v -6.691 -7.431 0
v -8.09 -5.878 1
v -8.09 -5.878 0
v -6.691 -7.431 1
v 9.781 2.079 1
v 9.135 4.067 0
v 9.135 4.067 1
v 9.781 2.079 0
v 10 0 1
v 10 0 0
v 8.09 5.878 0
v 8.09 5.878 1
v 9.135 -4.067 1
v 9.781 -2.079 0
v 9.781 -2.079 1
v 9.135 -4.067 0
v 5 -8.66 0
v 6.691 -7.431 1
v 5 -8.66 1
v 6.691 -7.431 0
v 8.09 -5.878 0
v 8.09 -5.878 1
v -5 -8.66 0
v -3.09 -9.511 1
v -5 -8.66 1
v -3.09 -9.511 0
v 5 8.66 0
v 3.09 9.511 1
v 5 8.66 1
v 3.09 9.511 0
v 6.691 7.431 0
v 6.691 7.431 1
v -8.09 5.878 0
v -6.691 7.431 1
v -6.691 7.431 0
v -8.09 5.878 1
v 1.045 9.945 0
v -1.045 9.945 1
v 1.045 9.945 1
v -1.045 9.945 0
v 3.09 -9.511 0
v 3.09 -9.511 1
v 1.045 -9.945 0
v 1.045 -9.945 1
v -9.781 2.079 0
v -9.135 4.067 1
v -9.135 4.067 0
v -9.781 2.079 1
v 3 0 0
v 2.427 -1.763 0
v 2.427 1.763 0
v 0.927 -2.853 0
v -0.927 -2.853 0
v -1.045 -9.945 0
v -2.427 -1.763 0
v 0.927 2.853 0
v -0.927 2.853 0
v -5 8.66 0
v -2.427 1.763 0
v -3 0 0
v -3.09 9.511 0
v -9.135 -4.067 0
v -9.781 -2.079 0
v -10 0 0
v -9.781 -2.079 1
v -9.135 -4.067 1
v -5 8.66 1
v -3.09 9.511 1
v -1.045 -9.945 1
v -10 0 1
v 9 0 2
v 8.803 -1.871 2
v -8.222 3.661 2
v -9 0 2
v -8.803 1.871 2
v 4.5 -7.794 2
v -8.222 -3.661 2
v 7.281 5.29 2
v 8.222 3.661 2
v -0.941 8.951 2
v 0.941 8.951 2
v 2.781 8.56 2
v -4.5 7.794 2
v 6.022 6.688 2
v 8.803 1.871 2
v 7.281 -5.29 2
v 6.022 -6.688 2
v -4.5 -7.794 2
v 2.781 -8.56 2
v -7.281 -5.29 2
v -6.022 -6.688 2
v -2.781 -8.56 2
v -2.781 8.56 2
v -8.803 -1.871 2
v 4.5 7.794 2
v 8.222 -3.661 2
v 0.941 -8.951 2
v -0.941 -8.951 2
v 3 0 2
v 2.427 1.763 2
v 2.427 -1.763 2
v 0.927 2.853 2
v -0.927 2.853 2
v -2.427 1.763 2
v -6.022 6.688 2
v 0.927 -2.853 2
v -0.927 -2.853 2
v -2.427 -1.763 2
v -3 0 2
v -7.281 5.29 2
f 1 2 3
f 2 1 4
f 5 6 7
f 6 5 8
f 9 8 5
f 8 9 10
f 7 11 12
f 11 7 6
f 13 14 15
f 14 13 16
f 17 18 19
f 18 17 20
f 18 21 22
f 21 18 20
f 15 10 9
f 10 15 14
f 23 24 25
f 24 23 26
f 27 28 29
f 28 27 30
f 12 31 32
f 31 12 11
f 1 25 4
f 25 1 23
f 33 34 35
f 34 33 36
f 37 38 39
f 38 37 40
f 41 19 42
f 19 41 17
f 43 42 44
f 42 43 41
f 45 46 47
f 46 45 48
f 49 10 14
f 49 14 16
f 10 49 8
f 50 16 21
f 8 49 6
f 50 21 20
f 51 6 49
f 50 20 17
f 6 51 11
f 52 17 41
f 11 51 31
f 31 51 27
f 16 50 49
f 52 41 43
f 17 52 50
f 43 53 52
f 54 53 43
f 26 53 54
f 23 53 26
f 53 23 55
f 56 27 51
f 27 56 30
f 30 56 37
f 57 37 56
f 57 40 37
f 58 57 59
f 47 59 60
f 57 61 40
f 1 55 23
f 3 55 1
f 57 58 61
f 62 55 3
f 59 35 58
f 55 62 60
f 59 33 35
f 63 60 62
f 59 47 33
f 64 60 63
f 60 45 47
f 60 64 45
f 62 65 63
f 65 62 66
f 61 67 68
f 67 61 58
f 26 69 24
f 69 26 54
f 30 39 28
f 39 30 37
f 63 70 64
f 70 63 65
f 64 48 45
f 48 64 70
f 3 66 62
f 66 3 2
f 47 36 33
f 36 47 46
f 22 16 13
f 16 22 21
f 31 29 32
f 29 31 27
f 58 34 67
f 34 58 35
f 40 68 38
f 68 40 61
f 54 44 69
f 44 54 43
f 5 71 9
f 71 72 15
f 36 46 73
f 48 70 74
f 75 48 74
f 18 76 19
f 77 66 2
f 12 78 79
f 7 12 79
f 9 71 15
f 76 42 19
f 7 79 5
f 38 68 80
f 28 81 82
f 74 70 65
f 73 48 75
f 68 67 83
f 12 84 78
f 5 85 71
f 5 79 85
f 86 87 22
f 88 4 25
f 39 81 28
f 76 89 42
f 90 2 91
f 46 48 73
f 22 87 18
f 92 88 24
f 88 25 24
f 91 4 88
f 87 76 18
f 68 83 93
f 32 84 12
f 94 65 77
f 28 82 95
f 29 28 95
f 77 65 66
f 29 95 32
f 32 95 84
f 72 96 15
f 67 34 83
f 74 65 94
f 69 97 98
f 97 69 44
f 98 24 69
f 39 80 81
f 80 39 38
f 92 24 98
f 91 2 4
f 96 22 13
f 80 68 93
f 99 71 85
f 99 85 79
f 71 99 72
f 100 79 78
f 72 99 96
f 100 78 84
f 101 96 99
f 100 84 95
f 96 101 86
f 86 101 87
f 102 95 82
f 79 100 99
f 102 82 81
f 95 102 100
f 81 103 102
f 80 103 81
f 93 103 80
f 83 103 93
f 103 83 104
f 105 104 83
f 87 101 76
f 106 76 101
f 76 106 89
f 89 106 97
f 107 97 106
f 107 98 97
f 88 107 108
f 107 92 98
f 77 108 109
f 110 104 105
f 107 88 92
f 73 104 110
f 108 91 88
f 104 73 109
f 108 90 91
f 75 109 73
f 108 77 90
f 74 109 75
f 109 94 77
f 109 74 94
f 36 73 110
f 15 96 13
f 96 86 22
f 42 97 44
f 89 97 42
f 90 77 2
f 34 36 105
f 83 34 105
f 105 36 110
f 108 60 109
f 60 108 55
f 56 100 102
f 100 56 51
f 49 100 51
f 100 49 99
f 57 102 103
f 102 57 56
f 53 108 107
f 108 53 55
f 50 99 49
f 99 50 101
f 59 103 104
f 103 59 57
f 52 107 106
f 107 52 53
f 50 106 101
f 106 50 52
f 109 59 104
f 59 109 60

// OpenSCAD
module hubcap(tireRadius=13, rimDepth=3, rimInset=3, axleRadius=3, tireWidth=10) {
    difference() {
    union() {
        cylinder(r=tireRadius-rimInset, h=1, center=false);
        translate([0, 0, 1])
            cylinder(r1=tireRadius-rimInset, r2=(tireRadius-rimInset)*0.9, h=rimDepth-2, center=false);
    }
    
    // tunnel for axles
        cylinder(r=axleRadius, h=tireWidth*4, center=true);
    
    }
}

hubcap();
